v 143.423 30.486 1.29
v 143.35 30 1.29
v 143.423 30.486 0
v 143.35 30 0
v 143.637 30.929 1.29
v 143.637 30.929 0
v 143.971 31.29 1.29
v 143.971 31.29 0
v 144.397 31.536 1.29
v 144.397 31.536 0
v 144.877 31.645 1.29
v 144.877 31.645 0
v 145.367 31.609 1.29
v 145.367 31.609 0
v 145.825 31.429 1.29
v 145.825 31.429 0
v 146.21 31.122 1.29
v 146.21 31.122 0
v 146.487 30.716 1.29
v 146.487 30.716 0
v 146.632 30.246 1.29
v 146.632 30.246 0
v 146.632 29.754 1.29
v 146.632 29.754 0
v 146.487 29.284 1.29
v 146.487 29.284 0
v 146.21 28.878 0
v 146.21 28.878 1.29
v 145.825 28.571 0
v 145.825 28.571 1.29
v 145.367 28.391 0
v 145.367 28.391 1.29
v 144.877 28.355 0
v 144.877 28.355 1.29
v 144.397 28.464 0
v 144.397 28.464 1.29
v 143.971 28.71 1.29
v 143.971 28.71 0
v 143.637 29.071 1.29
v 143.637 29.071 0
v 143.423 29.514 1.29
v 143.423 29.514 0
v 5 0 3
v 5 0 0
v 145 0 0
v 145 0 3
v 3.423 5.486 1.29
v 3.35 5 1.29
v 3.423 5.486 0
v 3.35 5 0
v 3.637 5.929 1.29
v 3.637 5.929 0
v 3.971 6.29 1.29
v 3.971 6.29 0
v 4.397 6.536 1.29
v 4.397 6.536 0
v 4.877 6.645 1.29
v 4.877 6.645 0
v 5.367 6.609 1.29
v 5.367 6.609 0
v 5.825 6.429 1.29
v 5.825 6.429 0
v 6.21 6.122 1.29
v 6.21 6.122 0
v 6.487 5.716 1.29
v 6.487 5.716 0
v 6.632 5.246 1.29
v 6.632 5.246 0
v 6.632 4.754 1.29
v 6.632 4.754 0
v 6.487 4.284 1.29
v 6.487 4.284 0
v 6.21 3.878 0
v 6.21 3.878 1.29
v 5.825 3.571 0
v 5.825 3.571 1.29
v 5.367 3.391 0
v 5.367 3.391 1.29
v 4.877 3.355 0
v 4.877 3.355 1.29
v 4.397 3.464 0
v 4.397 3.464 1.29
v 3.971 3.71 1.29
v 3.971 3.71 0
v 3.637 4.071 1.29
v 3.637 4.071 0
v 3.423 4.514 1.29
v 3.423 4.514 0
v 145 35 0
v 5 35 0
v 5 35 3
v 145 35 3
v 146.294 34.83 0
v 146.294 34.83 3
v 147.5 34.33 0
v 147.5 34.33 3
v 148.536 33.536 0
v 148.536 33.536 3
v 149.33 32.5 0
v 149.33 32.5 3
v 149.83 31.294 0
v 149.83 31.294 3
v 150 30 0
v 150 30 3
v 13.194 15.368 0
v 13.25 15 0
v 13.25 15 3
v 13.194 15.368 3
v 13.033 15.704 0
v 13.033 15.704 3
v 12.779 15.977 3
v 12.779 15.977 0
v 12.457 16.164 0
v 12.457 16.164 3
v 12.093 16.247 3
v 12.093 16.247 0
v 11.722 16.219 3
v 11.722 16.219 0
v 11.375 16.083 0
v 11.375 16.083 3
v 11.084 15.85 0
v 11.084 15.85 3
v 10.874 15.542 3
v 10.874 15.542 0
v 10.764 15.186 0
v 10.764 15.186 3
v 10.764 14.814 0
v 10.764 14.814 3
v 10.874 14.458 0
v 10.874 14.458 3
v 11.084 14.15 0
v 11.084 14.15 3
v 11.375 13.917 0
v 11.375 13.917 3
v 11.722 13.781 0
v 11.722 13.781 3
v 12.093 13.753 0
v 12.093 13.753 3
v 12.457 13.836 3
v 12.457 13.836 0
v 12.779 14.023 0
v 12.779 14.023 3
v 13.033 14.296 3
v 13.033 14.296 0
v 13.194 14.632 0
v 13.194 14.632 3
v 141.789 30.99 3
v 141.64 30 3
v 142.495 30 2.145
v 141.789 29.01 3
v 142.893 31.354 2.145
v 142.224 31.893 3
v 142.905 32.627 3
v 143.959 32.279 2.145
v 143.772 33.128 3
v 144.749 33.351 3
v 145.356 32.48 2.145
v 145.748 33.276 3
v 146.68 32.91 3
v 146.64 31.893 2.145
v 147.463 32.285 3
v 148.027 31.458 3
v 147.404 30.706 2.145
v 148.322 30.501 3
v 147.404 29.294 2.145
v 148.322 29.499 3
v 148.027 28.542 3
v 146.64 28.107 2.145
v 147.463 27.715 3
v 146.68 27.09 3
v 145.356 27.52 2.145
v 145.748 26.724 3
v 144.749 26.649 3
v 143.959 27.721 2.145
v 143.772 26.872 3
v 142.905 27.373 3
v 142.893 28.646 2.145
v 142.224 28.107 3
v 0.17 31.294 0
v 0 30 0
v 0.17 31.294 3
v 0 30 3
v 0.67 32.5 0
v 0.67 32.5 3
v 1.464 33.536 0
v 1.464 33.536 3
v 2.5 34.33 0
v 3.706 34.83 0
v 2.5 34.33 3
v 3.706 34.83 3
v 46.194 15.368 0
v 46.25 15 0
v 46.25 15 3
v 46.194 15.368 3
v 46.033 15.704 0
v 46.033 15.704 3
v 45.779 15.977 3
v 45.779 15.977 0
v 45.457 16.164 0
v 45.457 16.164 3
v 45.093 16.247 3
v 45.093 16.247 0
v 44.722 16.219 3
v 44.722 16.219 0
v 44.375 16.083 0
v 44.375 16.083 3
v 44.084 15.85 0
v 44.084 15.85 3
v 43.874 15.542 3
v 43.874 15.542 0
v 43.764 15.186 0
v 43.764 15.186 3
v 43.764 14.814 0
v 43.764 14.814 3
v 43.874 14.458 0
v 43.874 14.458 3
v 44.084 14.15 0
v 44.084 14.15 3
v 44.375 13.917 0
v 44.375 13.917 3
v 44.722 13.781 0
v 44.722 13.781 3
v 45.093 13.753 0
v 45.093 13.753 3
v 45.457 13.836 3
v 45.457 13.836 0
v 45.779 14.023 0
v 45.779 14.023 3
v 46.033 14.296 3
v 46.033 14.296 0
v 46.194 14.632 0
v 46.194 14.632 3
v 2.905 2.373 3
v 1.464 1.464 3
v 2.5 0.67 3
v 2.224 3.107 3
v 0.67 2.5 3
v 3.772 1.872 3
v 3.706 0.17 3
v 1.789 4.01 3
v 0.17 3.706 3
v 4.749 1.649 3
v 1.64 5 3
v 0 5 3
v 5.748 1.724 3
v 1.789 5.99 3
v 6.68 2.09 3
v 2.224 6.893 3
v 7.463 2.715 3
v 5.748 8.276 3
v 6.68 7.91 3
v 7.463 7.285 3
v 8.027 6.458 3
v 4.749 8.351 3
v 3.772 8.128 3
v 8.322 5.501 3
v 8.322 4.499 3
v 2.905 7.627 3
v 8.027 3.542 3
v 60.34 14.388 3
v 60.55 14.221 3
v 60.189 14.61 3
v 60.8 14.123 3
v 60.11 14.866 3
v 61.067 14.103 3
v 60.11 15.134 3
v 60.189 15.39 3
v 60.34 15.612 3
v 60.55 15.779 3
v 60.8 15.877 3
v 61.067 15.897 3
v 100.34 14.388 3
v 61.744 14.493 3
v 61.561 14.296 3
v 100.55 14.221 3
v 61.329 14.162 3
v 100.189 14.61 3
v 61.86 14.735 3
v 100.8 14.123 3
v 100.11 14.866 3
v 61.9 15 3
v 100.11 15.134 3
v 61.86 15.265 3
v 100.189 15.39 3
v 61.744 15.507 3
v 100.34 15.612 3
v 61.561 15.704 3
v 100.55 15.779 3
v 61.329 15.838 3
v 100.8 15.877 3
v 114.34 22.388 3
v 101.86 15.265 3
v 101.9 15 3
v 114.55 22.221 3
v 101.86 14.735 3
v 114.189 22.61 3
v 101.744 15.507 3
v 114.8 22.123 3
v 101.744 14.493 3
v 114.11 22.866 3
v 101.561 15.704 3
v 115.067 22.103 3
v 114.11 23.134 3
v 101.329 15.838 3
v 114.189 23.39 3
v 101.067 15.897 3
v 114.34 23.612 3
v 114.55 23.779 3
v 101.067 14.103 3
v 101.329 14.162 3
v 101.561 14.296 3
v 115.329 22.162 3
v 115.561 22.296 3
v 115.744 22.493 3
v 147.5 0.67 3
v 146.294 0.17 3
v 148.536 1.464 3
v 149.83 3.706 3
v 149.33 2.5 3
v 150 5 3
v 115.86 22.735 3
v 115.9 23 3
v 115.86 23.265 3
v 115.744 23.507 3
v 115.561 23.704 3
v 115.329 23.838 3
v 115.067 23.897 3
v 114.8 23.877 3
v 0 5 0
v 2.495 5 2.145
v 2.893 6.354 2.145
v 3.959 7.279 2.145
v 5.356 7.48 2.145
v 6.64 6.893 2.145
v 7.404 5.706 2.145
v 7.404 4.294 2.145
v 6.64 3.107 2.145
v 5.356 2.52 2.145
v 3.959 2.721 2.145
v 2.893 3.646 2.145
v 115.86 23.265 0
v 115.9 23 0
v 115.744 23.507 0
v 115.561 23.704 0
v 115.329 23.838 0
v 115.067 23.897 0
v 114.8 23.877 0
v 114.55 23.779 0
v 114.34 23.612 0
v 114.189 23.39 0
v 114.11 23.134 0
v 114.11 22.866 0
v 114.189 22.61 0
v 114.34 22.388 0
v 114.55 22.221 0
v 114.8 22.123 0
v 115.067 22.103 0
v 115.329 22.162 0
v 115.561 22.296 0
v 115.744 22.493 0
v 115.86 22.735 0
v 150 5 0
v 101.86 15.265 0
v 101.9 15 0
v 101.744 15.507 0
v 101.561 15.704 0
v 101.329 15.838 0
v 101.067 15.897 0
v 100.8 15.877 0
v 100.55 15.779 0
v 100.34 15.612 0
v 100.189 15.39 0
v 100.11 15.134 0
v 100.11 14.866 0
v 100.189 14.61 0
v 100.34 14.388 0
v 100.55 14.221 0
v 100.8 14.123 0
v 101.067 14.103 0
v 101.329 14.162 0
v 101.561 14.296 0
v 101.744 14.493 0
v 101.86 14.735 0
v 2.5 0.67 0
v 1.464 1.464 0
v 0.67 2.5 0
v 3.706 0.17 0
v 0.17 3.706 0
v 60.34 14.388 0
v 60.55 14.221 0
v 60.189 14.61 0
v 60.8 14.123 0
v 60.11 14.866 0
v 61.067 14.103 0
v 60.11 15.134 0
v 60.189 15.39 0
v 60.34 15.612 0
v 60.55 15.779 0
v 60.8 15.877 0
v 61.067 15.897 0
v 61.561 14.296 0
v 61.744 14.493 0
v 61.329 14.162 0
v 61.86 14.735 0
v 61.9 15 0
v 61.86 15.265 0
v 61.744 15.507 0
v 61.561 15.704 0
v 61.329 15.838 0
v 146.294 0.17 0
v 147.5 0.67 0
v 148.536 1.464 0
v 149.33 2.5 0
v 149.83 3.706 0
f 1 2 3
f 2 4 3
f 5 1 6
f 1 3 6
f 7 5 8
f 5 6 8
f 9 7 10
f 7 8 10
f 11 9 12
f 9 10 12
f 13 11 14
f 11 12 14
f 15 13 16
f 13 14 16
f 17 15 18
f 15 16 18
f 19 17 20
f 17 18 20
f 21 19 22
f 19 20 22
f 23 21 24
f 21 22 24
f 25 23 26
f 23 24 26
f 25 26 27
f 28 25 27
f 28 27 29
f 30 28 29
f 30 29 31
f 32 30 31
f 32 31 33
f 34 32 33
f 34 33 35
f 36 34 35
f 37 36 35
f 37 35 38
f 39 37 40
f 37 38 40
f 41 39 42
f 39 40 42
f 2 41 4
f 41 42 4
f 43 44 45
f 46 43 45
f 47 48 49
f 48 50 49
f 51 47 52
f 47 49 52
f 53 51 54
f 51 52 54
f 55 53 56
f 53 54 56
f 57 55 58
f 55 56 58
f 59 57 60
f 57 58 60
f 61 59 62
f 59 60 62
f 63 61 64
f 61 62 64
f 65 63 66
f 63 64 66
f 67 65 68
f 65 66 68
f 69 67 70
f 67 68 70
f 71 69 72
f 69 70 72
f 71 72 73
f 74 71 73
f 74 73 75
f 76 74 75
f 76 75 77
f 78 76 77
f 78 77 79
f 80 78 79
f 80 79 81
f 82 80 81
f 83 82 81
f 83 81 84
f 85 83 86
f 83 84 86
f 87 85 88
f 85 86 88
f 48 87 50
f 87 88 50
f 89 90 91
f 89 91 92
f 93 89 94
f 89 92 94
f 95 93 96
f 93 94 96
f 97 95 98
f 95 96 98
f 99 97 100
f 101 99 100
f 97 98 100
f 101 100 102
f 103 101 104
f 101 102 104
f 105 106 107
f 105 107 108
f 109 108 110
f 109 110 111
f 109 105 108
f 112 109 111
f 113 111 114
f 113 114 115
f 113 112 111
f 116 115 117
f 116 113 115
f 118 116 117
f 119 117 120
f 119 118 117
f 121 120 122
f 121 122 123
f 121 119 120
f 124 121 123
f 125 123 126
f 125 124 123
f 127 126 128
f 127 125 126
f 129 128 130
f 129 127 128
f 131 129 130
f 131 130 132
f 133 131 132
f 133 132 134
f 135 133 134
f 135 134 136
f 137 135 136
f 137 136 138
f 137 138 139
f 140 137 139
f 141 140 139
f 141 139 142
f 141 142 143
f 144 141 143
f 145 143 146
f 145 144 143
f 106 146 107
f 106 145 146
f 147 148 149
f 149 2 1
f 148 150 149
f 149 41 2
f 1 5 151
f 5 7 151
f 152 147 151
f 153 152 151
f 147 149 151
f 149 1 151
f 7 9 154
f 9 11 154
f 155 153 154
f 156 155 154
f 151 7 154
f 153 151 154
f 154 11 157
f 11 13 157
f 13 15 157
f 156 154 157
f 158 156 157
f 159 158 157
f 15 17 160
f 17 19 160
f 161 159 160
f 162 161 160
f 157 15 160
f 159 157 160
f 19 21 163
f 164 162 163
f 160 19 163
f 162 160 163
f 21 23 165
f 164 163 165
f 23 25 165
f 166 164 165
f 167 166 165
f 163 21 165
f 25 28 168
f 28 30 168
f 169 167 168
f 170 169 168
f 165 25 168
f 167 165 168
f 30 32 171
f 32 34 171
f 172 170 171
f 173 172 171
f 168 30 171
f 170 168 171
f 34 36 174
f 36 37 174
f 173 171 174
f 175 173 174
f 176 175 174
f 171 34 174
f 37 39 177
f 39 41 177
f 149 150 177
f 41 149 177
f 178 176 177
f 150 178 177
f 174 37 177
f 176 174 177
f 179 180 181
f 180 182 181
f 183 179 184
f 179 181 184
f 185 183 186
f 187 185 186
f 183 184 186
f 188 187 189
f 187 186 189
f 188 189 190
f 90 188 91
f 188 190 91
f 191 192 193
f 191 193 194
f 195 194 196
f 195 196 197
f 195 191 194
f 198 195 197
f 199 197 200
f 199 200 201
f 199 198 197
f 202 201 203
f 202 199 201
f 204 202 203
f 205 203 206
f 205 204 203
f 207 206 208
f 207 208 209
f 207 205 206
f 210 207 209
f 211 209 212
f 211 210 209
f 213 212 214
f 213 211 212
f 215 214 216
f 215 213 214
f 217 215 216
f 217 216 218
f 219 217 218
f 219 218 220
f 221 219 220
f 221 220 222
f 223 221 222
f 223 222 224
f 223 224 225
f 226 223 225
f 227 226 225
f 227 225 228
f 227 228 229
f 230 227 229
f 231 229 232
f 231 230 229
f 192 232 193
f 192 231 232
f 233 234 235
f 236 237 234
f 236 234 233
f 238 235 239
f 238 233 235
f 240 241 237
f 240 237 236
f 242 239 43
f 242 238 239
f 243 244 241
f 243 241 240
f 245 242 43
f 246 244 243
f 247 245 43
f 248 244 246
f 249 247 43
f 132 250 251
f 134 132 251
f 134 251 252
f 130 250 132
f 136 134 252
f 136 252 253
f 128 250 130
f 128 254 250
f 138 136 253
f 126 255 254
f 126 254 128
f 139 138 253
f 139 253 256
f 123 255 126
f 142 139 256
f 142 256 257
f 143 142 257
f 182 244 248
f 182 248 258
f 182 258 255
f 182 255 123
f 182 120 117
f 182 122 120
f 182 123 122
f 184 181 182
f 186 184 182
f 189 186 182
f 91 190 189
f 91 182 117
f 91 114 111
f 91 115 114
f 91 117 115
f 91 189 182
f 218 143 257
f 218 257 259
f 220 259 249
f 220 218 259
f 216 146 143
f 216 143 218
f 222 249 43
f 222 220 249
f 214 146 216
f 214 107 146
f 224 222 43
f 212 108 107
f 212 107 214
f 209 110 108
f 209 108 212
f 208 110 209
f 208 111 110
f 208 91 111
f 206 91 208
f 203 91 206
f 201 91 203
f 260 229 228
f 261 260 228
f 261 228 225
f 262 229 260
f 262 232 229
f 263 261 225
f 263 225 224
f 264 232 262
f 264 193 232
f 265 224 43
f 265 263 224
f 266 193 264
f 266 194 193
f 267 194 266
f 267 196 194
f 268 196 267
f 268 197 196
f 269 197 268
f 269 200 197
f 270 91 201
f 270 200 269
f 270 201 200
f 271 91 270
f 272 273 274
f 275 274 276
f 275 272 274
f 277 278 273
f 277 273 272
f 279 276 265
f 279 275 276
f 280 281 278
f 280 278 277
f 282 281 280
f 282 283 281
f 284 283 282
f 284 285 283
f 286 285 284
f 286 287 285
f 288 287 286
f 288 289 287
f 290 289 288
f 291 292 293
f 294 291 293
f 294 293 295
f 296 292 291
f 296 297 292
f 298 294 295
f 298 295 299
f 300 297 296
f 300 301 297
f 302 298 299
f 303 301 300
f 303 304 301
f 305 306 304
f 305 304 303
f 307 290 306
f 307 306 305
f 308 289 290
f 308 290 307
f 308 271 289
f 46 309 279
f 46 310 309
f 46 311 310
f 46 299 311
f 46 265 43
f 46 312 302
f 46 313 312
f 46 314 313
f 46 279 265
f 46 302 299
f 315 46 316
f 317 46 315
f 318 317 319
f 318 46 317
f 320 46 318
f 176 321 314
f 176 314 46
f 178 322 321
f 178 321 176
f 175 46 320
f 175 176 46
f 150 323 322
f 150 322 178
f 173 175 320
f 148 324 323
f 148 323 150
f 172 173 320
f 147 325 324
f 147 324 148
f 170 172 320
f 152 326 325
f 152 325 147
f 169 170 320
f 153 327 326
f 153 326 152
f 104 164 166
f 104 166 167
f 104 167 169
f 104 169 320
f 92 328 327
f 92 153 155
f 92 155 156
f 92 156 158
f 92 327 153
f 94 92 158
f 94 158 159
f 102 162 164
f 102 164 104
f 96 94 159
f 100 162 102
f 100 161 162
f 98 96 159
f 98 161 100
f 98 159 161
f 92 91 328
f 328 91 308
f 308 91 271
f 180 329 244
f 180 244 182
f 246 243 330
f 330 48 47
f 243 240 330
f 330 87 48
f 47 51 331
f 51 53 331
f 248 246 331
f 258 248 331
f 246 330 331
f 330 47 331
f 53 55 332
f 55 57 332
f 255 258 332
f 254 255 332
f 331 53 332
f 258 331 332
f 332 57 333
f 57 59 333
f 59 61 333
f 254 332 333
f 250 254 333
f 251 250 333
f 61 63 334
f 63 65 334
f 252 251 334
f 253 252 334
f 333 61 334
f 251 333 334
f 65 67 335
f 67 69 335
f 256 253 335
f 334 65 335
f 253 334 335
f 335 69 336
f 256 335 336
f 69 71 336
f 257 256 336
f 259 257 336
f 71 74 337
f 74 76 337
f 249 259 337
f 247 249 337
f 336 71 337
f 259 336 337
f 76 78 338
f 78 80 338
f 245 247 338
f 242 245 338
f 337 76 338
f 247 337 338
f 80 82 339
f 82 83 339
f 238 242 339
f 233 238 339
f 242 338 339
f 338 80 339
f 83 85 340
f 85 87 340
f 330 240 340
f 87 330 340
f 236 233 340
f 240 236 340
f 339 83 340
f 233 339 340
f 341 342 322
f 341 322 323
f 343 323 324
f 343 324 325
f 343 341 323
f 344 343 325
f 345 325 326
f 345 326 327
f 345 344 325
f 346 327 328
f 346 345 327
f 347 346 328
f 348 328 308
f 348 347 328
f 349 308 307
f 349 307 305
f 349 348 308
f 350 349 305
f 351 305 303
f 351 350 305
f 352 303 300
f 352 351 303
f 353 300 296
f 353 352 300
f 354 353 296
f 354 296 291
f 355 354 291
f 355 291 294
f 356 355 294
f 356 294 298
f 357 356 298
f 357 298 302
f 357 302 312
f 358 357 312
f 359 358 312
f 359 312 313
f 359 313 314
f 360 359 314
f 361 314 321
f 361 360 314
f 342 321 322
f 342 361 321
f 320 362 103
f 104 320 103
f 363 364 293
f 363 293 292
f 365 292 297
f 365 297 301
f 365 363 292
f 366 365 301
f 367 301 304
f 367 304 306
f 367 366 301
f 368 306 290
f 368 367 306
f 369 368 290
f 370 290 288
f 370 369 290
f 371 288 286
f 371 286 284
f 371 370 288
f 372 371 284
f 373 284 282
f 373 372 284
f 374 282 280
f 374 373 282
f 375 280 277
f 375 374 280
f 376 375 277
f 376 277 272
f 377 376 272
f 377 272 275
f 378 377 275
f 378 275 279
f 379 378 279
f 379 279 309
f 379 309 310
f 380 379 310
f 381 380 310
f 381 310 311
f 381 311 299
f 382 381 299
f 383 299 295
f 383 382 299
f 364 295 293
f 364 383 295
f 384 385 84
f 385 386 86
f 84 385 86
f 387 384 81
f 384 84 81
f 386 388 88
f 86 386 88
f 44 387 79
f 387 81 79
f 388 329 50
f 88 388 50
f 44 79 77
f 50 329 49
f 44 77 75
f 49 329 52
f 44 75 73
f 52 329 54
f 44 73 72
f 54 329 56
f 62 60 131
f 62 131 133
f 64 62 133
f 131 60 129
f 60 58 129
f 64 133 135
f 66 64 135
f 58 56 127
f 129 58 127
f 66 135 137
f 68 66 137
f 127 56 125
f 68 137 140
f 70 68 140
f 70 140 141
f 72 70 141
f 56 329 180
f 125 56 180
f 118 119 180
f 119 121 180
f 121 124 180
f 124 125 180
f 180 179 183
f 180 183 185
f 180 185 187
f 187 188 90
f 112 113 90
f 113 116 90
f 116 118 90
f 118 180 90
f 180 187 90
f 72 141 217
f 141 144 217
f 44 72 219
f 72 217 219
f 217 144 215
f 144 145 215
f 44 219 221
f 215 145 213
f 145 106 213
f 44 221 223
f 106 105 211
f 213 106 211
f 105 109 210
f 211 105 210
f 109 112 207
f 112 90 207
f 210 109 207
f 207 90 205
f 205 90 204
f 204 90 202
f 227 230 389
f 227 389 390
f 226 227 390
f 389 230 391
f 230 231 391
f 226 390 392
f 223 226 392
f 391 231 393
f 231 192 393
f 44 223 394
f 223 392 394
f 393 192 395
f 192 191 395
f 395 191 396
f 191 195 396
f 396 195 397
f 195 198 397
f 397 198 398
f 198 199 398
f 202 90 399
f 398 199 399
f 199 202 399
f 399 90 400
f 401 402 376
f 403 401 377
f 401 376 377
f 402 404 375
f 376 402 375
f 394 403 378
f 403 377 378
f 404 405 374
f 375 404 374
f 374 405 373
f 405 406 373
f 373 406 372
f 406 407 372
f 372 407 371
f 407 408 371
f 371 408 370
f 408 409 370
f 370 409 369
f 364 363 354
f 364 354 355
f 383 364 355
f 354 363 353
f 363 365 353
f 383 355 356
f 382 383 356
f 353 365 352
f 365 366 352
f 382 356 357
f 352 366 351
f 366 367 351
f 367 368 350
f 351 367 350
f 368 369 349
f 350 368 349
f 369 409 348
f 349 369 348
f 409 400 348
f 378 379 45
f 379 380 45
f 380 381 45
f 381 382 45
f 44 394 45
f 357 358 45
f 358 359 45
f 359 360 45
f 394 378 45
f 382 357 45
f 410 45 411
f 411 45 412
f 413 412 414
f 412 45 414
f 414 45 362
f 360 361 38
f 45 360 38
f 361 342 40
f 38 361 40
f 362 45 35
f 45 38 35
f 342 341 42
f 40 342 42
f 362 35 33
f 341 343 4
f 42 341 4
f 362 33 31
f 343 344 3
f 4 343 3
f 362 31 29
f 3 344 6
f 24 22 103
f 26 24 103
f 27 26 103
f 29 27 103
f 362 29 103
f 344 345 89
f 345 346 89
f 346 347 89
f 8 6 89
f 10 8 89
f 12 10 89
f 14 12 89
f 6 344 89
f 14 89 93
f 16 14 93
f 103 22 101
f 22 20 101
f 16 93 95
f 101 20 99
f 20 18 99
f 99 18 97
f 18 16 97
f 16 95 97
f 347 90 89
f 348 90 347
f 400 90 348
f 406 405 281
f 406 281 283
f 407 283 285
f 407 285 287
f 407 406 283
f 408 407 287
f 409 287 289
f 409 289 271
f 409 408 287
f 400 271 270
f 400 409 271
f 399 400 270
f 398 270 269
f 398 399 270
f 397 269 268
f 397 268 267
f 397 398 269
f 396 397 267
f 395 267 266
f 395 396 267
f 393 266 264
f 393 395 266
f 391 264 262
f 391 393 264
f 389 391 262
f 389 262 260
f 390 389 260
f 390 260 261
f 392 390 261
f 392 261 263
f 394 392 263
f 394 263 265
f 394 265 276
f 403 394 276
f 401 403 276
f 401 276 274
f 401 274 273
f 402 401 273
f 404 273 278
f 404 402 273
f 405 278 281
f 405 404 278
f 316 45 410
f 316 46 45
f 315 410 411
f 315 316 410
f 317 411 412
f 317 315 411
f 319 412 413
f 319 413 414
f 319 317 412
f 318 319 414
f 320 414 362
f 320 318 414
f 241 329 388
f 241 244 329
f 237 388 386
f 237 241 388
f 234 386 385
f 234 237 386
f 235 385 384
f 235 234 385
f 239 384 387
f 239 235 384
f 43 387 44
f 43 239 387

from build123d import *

# Parameters (mm, degrees)
F0_W           = 150
F0_H           = 35
F0_R           = 1.25
F0_R_2         = 0.9
F1_DEPTH       = 3
F2_R           = 5
F4_D           = 3.3
F4_CSINK_D     = 6.72
F4_CSINK_ANGLE = 90


with BuildPart() as f1:
    # F0 (on Top) → F1 (new body)
    with BuildSketch(Plane.XY):
        with Locations((75, 17.5)):
            Rectangle(F0_W, F0_H)
        with Locations((12, 15)):
            Circle(F0_R, mode=Mode.SUBTRACT)
        with Locations((45, 15)):
            Circle(F0_R, mode=Mode.SUBTRACT)
        with Locations((61, 15)):
            Circle(F0_R_2, mode=Mode.SUBTRACT)
        with Locations((101, 15)):
            Circle(F0_R_2, mode=Mode.SUBTRACT)
        with Locations((115, 23)):
            Circle(F0_R_2, mode=Mode.SUBTRACT)
    extrude(amount=F1_DEPTH)

    # F2
    f2_edges = [f1.edges().sort_by_distance(p)[0] for p in [
        (0, 35, 1.5),
        (0, 0, 1.5),
        (150, 0, 1.5),
        (150, 35, 1.5),
    ]]
    fillet(f2_edges, radius=F2_R)

    # F4 (through all)
    with Locations(Plane.XY.offset(3)):
        with Locations((5, 5), (145, 30)):
            CounterSinkHole(F4_D / 2, F4_CSINK_D / 2, counter_sink_angle=F4_CSINK_ANGLE)


solid = f1.part
